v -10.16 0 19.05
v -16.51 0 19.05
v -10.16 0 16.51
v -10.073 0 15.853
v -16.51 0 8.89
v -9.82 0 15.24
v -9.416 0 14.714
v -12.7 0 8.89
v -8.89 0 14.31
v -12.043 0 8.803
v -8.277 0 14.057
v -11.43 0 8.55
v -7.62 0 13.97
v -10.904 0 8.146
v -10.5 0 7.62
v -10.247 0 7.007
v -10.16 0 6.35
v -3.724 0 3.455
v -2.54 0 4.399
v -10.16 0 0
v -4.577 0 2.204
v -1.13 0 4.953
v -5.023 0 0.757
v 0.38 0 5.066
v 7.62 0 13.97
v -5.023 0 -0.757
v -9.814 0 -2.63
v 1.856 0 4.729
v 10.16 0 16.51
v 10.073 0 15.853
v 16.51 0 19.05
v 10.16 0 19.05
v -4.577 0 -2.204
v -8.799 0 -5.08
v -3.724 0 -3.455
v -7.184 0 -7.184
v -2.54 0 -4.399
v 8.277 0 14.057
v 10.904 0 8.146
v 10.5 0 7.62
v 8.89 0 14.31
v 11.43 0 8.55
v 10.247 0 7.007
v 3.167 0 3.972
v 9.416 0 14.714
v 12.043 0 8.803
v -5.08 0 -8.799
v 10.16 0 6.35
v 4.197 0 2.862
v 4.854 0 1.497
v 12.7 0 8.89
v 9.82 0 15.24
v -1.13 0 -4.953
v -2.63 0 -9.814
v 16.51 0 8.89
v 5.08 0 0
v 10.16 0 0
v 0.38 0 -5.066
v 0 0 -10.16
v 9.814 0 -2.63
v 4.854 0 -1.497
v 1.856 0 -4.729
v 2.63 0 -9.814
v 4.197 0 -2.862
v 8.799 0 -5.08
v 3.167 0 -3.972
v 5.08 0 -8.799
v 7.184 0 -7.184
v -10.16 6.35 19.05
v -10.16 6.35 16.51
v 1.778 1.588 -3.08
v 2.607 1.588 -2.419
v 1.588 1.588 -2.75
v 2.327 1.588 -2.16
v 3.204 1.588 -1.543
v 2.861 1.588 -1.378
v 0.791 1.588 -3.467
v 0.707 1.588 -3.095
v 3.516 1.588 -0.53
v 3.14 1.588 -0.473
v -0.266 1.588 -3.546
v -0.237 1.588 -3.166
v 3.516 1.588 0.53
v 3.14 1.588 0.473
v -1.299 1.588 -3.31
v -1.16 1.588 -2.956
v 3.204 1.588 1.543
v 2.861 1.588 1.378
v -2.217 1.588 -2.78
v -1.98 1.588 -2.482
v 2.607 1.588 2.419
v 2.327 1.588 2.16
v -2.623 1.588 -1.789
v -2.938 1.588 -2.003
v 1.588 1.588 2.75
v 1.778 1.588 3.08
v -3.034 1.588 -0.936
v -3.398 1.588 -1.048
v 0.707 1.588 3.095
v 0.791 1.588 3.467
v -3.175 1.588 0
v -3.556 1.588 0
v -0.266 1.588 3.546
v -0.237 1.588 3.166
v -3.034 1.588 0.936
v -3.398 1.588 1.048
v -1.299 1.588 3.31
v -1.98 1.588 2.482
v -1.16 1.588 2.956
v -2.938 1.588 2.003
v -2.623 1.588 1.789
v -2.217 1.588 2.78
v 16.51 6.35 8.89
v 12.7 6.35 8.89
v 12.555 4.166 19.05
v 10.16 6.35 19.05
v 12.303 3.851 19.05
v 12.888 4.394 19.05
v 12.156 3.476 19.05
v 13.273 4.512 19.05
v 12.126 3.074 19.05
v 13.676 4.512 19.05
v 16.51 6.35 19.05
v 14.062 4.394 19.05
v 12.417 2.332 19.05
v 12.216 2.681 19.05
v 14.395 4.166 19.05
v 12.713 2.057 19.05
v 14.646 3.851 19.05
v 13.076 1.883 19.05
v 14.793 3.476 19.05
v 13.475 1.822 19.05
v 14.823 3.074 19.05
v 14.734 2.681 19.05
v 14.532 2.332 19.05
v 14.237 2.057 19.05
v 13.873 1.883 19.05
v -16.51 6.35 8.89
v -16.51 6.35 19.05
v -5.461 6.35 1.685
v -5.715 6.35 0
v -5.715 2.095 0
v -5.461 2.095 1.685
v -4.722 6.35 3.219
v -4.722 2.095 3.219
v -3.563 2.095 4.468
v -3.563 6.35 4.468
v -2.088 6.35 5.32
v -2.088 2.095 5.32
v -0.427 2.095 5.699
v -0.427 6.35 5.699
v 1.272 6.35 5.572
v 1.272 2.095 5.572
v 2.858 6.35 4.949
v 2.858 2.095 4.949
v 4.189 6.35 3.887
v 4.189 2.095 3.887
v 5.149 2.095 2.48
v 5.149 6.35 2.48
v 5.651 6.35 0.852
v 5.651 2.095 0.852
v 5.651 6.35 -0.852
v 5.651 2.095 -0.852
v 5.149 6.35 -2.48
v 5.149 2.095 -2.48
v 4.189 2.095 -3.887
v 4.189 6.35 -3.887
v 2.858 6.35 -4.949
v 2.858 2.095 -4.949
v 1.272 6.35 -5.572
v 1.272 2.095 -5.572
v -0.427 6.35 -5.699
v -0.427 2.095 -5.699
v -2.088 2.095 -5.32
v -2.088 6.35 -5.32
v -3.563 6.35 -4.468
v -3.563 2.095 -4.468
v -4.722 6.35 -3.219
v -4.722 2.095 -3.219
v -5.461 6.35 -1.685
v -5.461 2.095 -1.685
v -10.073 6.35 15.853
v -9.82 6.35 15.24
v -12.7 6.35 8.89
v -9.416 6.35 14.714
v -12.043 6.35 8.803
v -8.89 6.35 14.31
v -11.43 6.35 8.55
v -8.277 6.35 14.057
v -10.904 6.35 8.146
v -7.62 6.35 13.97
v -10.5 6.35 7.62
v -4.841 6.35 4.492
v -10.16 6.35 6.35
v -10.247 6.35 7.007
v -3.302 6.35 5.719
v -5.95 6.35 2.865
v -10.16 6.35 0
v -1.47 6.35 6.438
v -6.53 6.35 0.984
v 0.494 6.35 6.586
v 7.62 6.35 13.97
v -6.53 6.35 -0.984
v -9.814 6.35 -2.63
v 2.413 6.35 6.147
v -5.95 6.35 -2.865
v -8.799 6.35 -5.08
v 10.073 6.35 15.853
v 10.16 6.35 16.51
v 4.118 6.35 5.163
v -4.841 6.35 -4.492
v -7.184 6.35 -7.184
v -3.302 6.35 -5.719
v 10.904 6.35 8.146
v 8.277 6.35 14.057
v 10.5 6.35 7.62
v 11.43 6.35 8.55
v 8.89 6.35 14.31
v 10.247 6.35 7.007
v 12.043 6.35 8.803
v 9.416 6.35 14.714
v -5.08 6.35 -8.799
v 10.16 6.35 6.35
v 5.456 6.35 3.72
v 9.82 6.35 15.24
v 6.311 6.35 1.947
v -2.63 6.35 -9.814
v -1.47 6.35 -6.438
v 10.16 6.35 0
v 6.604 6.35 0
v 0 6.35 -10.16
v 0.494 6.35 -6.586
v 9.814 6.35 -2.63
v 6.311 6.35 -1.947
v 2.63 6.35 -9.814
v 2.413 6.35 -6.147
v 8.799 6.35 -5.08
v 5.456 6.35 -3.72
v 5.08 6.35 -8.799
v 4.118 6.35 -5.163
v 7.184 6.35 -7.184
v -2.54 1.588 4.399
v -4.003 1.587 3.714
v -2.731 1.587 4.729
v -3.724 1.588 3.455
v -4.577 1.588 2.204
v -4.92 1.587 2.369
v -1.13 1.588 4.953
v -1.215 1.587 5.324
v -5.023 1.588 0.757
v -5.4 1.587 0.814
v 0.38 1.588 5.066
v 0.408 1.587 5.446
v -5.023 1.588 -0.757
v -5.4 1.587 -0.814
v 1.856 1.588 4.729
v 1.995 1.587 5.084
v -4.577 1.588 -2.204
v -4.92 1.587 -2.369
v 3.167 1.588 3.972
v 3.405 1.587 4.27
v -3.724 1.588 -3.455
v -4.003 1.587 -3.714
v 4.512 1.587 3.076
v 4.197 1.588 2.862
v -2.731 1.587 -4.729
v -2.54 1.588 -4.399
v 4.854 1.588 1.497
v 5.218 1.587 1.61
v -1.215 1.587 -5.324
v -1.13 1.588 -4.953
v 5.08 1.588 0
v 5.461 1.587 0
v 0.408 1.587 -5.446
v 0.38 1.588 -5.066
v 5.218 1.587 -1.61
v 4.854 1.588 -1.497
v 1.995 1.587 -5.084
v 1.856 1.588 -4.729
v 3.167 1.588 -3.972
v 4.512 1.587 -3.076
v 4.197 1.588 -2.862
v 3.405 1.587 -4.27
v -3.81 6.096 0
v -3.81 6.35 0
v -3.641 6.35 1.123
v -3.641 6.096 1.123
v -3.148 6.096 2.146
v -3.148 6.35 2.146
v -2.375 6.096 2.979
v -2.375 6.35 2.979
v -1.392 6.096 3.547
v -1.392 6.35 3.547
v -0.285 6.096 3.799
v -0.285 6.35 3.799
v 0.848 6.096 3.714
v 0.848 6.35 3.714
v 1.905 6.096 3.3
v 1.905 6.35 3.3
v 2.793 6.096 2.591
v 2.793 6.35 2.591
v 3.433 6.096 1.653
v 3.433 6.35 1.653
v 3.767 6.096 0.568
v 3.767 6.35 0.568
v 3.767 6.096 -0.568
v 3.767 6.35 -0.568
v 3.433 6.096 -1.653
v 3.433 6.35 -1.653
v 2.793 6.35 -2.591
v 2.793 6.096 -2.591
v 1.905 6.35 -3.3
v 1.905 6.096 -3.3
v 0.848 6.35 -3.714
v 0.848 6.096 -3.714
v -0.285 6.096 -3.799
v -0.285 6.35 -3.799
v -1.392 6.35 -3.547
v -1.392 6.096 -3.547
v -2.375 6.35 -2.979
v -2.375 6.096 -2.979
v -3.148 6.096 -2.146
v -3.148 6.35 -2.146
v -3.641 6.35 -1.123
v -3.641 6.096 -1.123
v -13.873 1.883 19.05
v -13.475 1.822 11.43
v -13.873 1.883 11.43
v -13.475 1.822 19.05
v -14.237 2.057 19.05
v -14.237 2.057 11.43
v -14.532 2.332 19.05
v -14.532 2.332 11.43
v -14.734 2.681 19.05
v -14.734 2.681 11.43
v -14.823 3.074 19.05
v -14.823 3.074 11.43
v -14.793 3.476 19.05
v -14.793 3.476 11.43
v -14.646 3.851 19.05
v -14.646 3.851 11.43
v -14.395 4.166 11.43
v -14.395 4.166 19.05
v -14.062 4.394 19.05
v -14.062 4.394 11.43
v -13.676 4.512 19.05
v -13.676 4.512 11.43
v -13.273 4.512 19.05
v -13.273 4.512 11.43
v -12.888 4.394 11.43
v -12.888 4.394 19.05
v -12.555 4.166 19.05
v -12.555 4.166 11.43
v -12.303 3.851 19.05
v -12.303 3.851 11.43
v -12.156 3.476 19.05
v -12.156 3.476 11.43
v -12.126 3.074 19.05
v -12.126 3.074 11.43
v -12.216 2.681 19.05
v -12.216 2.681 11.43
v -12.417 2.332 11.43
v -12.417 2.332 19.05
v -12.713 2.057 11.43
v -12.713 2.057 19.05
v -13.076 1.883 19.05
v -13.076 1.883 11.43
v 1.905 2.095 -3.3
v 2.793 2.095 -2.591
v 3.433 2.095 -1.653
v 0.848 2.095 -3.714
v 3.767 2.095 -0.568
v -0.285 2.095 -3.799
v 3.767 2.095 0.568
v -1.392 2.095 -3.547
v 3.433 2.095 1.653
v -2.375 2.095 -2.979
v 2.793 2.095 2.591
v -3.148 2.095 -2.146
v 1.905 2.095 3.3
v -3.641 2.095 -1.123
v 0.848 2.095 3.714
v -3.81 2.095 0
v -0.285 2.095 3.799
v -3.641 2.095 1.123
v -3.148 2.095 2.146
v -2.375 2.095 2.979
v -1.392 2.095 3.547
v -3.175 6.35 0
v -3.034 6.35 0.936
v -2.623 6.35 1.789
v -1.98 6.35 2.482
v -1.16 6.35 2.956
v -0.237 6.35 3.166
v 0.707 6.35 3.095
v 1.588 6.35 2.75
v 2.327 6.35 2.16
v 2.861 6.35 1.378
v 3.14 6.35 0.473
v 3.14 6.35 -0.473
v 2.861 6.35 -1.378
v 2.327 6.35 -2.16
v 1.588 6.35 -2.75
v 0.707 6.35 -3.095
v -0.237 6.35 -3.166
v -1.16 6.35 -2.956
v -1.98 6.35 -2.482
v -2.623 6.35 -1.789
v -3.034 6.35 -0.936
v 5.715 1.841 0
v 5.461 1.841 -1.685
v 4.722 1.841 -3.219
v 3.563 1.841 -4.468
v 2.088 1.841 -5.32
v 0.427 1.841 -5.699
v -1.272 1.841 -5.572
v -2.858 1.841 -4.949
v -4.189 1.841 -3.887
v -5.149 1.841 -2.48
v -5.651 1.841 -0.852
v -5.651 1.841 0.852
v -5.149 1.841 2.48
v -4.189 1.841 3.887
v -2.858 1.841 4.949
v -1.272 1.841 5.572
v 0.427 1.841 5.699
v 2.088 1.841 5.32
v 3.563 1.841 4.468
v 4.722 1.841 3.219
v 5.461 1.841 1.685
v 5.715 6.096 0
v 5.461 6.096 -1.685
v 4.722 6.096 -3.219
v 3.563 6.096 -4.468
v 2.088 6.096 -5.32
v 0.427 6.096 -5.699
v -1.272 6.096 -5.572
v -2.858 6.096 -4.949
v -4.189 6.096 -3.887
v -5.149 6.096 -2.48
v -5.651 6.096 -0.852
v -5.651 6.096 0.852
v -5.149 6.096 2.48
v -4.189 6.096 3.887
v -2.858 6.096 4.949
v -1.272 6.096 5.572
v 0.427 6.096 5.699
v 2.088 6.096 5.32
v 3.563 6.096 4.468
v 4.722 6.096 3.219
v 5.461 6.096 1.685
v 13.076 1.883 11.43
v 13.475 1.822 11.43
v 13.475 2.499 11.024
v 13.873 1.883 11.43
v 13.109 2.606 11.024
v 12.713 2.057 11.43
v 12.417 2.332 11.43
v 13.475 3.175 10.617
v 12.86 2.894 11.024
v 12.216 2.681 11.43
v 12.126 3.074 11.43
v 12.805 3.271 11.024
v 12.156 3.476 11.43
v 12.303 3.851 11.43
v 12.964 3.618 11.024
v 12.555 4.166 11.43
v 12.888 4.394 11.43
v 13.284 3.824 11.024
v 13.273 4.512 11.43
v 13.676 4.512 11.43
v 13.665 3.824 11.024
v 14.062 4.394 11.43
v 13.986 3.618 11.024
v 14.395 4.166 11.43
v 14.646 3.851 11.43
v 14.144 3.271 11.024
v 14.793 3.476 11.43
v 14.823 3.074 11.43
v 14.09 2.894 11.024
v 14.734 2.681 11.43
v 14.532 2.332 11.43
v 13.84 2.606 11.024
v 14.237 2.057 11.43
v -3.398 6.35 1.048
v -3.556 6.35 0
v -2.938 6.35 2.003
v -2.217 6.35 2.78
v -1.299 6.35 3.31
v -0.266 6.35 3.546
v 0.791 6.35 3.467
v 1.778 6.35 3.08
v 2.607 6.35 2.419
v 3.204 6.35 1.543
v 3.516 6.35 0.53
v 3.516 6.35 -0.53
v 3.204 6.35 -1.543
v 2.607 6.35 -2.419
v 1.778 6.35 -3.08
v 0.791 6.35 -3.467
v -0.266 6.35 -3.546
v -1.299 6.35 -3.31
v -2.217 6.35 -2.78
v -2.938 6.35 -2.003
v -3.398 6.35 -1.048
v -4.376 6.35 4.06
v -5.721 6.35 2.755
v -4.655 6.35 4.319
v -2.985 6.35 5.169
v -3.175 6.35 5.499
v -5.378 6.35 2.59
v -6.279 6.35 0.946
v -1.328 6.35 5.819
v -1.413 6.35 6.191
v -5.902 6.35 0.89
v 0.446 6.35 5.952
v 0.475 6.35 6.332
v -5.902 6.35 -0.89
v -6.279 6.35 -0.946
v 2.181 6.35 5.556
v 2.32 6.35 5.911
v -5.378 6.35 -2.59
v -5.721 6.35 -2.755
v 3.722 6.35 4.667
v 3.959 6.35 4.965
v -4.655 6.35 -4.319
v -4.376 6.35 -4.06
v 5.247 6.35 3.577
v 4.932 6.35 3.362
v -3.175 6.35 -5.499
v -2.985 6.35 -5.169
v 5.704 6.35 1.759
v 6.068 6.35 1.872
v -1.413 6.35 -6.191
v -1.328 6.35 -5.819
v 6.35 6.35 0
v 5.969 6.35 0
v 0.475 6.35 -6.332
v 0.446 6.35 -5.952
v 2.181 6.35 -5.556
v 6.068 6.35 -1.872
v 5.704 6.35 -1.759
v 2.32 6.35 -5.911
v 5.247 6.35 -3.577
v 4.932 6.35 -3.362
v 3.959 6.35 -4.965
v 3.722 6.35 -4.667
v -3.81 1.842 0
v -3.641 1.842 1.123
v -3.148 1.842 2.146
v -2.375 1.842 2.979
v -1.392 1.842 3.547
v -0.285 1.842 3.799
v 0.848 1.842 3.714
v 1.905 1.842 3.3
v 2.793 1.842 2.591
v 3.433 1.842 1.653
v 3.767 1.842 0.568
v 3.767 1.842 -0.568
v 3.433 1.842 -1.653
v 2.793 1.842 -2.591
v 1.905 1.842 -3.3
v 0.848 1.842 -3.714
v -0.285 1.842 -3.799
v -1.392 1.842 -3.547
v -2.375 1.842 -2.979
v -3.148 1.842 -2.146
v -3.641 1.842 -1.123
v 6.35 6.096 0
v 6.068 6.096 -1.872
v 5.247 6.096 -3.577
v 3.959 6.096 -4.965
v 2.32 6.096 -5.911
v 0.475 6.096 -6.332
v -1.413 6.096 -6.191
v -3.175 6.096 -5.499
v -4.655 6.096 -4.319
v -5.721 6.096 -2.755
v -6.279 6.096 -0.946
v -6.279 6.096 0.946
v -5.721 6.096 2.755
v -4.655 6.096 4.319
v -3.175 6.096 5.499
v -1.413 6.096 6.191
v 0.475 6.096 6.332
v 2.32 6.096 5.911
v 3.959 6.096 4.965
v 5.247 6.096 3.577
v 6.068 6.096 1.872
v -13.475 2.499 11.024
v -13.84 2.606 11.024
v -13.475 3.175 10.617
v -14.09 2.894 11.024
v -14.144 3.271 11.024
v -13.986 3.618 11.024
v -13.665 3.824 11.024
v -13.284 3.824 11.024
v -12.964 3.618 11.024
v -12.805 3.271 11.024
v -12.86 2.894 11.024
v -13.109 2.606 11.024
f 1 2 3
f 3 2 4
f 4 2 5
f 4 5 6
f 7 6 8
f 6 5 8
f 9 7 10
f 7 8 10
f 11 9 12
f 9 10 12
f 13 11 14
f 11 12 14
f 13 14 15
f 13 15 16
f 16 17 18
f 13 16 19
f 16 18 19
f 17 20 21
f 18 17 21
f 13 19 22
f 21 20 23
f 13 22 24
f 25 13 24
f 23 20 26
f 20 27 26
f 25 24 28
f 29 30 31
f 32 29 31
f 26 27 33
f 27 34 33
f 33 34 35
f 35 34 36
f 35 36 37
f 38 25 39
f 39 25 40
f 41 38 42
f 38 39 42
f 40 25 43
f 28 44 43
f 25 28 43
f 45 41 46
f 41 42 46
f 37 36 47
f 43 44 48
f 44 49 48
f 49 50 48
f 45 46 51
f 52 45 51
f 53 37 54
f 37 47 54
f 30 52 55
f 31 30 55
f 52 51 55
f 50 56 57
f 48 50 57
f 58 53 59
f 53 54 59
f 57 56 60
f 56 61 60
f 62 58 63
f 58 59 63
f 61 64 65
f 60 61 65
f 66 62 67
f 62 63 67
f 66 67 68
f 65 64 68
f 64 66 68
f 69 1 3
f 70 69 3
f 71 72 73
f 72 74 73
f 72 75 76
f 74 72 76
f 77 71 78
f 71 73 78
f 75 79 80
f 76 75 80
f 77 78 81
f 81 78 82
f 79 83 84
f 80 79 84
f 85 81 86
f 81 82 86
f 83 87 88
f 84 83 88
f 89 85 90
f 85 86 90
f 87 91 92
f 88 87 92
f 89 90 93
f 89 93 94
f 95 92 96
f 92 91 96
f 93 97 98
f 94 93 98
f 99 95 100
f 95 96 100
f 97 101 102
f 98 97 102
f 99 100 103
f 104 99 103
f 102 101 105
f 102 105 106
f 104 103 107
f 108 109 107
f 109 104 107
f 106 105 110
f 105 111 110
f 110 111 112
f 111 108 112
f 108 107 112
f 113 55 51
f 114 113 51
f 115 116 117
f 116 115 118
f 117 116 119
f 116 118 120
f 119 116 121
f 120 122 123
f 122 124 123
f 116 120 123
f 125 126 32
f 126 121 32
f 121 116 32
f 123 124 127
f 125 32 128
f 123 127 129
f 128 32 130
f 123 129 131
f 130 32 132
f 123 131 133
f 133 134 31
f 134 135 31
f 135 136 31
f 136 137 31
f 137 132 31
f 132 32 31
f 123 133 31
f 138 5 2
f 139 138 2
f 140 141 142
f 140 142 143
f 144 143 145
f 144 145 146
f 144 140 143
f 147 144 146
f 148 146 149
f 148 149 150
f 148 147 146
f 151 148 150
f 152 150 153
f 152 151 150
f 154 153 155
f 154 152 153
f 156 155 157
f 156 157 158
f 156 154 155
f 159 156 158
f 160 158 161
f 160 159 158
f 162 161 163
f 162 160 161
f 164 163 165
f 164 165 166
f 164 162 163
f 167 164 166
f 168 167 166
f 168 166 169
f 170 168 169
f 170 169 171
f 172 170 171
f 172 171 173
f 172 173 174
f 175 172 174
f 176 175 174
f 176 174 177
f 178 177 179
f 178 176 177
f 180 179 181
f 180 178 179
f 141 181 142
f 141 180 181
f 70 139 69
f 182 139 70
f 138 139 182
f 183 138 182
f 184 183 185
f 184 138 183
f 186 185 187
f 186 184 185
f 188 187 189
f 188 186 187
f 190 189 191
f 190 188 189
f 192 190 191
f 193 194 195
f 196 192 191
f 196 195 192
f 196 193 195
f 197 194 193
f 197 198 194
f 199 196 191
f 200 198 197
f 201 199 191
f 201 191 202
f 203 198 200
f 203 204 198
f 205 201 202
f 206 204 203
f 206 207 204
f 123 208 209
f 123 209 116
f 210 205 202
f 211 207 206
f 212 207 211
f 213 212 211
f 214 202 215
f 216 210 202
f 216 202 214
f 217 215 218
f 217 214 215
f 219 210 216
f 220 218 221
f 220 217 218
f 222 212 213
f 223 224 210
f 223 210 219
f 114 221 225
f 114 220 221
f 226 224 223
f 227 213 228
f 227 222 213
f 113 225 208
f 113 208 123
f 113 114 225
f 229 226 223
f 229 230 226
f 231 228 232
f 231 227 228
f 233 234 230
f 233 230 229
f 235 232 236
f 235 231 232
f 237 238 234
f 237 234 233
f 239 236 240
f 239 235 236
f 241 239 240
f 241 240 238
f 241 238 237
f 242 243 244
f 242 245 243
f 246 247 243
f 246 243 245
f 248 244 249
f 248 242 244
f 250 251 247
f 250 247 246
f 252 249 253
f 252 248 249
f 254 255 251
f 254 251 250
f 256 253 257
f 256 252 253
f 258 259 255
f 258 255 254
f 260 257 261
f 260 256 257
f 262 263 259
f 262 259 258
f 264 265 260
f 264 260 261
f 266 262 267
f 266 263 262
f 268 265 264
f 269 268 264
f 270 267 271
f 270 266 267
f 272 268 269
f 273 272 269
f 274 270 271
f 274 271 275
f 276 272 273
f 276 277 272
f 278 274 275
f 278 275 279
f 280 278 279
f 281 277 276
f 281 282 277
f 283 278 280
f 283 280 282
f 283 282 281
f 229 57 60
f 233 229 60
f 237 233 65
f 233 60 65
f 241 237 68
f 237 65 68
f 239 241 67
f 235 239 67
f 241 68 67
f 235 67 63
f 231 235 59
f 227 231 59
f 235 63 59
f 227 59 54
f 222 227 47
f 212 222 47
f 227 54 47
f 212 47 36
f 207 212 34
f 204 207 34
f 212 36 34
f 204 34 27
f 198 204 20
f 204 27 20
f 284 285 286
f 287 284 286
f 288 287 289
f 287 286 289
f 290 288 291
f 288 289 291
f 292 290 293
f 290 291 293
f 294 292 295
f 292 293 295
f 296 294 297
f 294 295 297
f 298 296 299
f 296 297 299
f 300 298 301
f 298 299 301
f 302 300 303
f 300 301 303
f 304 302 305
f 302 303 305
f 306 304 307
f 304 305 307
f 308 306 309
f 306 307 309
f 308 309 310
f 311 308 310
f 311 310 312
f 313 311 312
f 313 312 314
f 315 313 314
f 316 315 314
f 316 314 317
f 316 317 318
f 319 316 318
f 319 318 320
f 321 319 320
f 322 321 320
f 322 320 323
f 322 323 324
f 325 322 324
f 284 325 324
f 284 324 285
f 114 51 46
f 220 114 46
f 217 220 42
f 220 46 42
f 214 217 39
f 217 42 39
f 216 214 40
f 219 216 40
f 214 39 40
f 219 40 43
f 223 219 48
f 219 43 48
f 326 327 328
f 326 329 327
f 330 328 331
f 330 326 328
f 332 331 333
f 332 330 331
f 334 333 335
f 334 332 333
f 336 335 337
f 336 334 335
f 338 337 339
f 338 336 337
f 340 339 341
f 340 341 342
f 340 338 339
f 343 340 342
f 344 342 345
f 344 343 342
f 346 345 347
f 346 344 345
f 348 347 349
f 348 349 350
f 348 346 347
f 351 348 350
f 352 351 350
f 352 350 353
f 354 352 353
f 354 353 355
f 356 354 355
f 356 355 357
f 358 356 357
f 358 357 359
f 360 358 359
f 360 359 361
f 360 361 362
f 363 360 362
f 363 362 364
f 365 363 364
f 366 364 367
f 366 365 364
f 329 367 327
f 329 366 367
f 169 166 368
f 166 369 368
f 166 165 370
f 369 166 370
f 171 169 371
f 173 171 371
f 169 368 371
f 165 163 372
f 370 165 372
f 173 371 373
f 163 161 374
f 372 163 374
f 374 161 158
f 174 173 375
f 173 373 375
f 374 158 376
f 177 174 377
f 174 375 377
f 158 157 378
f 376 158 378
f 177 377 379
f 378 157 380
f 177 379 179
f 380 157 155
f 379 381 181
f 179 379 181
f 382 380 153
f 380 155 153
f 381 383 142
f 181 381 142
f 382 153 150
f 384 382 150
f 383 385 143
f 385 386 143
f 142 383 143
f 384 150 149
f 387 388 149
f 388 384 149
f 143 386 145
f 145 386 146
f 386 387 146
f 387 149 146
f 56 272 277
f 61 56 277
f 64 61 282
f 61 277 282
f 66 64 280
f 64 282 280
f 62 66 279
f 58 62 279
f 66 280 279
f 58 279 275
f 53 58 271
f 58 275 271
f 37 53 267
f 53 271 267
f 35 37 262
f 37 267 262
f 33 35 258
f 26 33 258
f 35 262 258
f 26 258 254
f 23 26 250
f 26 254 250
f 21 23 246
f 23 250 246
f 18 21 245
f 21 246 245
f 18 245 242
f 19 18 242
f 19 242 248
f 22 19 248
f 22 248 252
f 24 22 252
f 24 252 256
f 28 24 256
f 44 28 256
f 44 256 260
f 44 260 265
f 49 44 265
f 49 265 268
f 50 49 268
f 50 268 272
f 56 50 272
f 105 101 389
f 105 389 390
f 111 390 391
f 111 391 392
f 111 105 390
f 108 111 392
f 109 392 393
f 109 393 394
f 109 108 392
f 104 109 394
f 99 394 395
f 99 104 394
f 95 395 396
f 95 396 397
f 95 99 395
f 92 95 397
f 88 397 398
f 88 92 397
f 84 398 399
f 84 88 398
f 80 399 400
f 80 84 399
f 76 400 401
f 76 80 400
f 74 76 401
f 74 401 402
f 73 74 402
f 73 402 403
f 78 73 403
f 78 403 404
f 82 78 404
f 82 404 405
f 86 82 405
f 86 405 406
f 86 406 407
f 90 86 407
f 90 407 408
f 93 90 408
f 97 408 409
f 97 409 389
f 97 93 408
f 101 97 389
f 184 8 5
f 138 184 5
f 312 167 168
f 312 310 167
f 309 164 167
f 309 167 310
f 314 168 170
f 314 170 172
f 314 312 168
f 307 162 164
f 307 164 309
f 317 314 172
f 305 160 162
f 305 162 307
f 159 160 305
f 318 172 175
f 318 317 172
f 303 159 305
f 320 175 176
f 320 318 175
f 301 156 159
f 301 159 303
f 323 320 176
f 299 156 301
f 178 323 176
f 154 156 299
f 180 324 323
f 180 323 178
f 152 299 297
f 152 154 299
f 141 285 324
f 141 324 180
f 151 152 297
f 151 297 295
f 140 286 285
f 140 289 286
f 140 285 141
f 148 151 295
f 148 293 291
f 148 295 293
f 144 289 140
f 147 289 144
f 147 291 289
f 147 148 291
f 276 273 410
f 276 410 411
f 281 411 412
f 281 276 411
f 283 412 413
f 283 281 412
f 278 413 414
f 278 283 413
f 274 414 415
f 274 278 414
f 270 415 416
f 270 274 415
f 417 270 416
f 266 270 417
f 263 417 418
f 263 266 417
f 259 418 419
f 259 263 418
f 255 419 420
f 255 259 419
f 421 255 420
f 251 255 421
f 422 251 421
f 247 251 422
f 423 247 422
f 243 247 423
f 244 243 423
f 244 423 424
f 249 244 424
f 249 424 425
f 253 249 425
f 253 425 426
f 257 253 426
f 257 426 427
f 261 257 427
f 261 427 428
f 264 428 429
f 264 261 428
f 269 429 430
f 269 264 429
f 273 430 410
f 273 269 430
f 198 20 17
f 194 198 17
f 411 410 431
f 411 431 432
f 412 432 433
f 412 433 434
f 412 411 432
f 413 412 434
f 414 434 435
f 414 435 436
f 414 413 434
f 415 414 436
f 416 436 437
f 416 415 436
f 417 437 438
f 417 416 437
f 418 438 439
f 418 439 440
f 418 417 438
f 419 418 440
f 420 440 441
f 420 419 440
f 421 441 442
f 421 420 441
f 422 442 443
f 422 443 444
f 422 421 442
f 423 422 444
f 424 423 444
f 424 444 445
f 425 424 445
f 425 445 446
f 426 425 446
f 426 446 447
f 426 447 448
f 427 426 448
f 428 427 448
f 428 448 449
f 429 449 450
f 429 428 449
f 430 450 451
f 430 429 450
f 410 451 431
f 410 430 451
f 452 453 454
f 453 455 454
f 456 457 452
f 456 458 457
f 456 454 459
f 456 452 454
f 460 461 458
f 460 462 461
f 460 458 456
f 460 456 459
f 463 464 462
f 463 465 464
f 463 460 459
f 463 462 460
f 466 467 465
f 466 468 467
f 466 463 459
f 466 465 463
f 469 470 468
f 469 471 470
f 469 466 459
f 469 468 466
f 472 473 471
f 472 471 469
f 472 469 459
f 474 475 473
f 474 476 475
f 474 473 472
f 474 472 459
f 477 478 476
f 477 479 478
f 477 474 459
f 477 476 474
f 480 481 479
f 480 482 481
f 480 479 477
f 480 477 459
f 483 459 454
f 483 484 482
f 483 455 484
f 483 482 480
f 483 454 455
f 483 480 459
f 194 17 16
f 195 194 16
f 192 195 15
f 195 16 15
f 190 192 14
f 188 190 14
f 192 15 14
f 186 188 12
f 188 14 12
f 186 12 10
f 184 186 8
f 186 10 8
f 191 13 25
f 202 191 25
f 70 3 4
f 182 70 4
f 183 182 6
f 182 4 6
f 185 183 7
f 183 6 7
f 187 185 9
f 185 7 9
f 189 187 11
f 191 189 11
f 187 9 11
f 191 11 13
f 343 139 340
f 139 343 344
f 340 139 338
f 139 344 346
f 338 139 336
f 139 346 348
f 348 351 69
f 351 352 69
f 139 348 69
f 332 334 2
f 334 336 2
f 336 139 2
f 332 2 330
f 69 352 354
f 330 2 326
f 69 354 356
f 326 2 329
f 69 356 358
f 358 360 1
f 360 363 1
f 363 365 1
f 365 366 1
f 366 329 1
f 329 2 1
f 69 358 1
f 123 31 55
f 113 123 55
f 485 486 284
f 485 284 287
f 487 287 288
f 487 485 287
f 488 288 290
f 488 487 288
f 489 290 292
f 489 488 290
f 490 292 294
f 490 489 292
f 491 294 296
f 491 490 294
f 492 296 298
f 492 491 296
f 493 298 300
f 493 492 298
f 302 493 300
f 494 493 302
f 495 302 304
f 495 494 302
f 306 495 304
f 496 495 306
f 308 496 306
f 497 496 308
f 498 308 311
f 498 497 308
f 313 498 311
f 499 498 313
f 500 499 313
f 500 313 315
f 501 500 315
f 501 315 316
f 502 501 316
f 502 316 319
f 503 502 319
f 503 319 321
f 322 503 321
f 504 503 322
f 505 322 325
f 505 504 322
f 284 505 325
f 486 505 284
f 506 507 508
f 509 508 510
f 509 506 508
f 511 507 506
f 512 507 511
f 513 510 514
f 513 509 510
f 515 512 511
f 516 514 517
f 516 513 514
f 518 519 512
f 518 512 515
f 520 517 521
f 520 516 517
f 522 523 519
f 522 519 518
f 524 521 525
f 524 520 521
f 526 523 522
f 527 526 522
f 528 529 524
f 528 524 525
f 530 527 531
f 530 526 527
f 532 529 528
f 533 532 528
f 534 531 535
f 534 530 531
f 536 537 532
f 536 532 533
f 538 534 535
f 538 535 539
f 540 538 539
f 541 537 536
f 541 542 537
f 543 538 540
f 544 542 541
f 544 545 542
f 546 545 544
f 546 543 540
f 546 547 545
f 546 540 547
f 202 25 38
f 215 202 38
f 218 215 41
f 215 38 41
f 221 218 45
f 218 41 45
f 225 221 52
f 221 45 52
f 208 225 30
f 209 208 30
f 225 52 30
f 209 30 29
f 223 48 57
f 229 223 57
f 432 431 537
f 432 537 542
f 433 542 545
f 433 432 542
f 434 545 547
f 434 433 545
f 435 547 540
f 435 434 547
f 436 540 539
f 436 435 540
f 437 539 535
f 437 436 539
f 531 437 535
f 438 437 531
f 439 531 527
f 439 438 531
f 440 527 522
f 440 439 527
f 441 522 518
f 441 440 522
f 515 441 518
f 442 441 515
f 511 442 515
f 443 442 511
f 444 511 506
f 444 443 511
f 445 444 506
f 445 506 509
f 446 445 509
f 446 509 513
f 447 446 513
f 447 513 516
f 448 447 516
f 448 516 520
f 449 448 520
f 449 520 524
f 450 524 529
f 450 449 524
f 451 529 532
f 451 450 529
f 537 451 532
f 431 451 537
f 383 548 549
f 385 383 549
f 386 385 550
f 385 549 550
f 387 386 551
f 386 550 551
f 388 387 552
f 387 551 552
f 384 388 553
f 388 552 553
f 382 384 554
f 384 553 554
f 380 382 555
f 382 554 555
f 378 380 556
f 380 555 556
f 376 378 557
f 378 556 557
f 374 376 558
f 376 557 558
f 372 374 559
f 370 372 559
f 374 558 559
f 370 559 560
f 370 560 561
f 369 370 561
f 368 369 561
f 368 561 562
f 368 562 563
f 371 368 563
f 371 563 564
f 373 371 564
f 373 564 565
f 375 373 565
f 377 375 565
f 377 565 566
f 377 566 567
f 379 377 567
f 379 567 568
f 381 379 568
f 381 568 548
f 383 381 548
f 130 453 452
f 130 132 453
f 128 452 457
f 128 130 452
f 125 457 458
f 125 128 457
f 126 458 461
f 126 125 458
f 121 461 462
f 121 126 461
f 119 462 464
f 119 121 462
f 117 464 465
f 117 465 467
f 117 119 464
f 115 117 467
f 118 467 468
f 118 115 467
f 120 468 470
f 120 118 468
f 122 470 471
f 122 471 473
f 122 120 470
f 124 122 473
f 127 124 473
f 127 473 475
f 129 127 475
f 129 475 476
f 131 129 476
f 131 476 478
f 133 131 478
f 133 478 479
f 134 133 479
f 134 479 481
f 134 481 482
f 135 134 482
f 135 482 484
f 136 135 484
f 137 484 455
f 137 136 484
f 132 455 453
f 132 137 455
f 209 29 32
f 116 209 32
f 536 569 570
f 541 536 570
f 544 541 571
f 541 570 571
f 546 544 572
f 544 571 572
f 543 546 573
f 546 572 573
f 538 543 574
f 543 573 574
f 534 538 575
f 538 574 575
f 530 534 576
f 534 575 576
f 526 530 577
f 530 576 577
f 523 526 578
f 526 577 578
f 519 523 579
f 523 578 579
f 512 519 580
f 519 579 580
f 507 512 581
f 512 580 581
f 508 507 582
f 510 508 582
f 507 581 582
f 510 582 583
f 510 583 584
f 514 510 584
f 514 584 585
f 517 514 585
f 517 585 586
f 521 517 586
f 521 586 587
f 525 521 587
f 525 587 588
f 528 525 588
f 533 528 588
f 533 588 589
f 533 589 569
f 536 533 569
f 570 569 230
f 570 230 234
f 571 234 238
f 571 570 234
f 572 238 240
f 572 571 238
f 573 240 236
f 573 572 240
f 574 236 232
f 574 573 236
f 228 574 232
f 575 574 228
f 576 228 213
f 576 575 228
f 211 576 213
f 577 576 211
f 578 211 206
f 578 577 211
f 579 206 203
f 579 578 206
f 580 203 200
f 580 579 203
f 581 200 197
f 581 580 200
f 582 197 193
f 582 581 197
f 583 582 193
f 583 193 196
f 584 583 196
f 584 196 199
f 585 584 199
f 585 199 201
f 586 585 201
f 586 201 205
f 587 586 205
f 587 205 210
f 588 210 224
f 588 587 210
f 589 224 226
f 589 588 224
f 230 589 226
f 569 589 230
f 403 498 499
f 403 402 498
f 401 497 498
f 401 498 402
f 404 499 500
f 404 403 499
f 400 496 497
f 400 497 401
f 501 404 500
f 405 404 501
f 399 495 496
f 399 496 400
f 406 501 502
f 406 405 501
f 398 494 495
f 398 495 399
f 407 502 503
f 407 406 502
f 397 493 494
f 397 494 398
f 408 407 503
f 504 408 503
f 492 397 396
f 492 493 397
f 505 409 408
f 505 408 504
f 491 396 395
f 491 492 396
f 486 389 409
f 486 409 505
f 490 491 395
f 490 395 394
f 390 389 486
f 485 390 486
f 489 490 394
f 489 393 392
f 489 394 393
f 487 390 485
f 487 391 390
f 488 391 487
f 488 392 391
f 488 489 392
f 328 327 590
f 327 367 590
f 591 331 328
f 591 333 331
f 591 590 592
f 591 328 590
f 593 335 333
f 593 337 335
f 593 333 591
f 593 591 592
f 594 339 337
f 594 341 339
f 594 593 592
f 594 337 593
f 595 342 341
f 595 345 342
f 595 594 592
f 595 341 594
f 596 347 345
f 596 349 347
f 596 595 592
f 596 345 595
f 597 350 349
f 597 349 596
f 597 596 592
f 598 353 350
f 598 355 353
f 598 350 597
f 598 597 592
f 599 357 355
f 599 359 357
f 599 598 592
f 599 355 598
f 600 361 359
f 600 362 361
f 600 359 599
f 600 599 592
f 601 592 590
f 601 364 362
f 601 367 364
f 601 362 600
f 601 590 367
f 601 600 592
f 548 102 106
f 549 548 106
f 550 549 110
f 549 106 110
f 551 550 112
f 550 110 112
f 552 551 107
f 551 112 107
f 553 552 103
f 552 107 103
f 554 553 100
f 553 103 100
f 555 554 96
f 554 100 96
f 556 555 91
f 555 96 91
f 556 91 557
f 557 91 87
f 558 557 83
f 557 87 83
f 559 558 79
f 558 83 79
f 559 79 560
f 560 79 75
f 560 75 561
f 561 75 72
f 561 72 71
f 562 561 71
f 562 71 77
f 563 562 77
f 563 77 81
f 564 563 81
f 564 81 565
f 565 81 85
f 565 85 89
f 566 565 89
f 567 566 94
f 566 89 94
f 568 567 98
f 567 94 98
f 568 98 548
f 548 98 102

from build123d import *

# Parameters (mm, degrees)
BOSS_EXTRUDE1_DEPTH            = 6.35
SKETCH2_R                      = 6.35
CUT_EXTRUDE1_DEPTH             = 4.7625
CUT_EXTRUDE2_REACH             = 3.587
SKETCH3_R                      = 5.08
CHAMFER1_SIZE                  = 0.254
SKETCH4_R                      = 6.35
SKETCH4_R_2                    = 5.715
BOSS_EXTRUDE2_DEPTH            = 4.7625
CHAMFER2_SIZE                  = 0.254
SKETCH5_R                      = 3.81
SKETCH5_R_2                    = 3.175
BOSS_EXTRUDE3_DEPTH            = 4.7625
CHAMFER3_SIZE                  = 0.254
SKETCH7_R                      = 5.715
SKETCH7_R_2                    = 3.81
BOSS_EXTRUDE4_DEPTH            = 4.2545
F_6_32_TAPPED_HOLE1_AT_2_COUNT = 2
F_6_32_TAPPED_HOLE1_AT_2_PITCH = 26.9494


with BuildPart() as part:
    # Sketch1 → Boss-Extrude1 (new body)
    with BuildSketch(Plane(origin=(0, 0, 0), x_dir=(1, 0, 0), z_dir=(0, 1, 0))):
        with BuildLine():
            Line((-10.16, 0), (-10.16, -6.35))
            ThreePointArc((-10.16, -6.35), (-10.903948776, -8.146051224), (-12.7, -8.89))
            Line((-12.7, -8.89), (-16.51, -8.89))
            Line((-16.51, -8.89), (-16.51, -19.05))
            Line((-16.51, -19.05), (-10.16, -19.05))
            Line((-10.16, -19.05), (-10.16, -16.51))
            ThreePointArc((-10.16, -16.51), (-9.416051224, -14.713948776), (-7.62, -13.97))
            Line((-7.62, -13.97), (7.62, -13.97))
            ThreePointArc((7.62, -13.97), (9.416051224, -14.713948776), (10.16, -16.51))
            Line((10.16, -16.51), (10.16, -19.05))
            Line((10.16, -19.05), (16.51, -19.05))
            Line((16.51, -19.05), (16.51, -8.89))
            Line((16.51, -8.89), (12.7, -8.89))
            ThreePointArc((12.7, -8.89), (10.903948776, -8.146051224), (10.16, -6.35))
            Line((10.16, -6.35), (10.16, 0))
            ThreePointArc((10.16, 0), (0, 10.16), (-10.16, 0))
        make_face()
    extrude(amount=BOSS_EXTRUDE1_DEPTH)

    # Sketch2 → Cut-Extrude1 (cut)
    with BuildSketch(Plane(origin=(0, 6.35, 0), x_dir=(1, 0, 0), z_dir=(0, 1, 0))):
        Circle(SKETCH2_R)
    extrude(amount=-CUT_EXTRUDE1_DEPTH, mode=Mode.SUBTRACT)

    # Sketch3 → Cut-Extrude2 (cut, up to next)
    with BuildSketch(Plane(origin=(0, 1.5875, 0), x_dir=(1, 0, 0), z_dir=(0, 1, 0)), mode=Mode.PRIVATE) as cut_extrude2_sk1:
        Circle(SKETCH3_R)
    cut_extrude2_tool1 = extrude(cut_extrude2_sk1.sketch, amount=-CUT_EXTRUDE2_REACH, mode=Mode.PRIVATE) & part.part
    add(cut_extrude2_tool1.solids().sort_by_distance((0, 1.5875, 0))[0], mode=Mode.SUBTRACT)

    # Chamfer1
    chamfer1_edges = [part.edges().sort_by_distance(p)[0] for p in [
        (-6.35, 6.35, 0),
    ]]
    chamfer(chamfer1_edges, length=CHAMFER1_SIZE)

    # Sketch4 → Boss-Extrude2 (add)
    with BuildSketch(Plane(origin=(0, 1.5875, 0), x_dir=(1, 0, 0), z_dir=(0, 1, 0))):
        Circle(SKETCH4_R)
        Circle(SKETCH4_R_2, mode=Mode.SUBTRACT)
    extrude(amount=BOSS_EXTRUDE2_DEPTH)

    # Chamfer2
    chamfer2_edges = [part.edges().sort_by_distance(p)[0] for p in [
        (-5.715, 1.5875, 0),
        (-5.715, 6.35, 0),
    ]]
    chamfer(chamfer2_edges, length=CHAMFER2_SIZE)

    # Sketch8 → #6-32 Tapped Hole1 (revolve, cut)
    with BuildSketch(Plane(origin=(-13.4747, 3.175, 19.05), x_dir=(0, -1, 0), z_dir=(1, 0, 0))):
        Polygon((0, 0), (0, 8.43269403), (1.35255, 7.62), (1.35255, 0), align=None)
    f_6_32_tapped_hole1 = revolve(axis=Axis((-13.4747, 3.175, 25.4), (0, 0, -1)), mode=Mode.SUBTRACT)

    # #6-32 Tapped Hole1 at 2: #6-32 Tapped Hole1 ×2
    with Locations(*[(i * F_6_32_TAPPED_HOLE1_AT_2_PITCH, 0, 0) for i in range(1, F_6_32_TAPPED_HOLE1_AT_2_COUNT)]):
        add(f_6_32_tapped_hole1, mode=Mode.SUBTRACT)


with BuildPart() as body_2:
    # Sketch5 → Boss-Extrude3 (new body)
    with BuildSketch(Plane(origin=(0, 1.5875, 0), x_dir=(-1, 0, 0), z_dir=(0, 1, 0))):
        Circle(SKETCH5_R)
        Circle(SKETCH5_R_2, mode=Mode.SUBTRACT)
    extrude(amount=BOSS_EXTRUDE3_DEPTH)

    # Chamfer3
    chamfer3_edges = [body_2.edges().sort_by_distance(p)[0] for p in [
        (3.81, 1.5875, 0),
        (3.81, 6.35, 0),
    ]]
    chamfer(chamfer3_edges, length=CHAMFER3_SIZE)

    # Sketch7 → Boss-Extrude4 (add)
    with BuildSketch(Plane(origin=(0, 6.35, 0), x_dir=(-1, 0, 0), z_dir=(0, 1, 0))):
        Circle(SKETCH7_R)
        Circle(SKETCH7_R_2, mode=Mode.SUBTRACT)
    extrude(amount=-BOSS_EXTRUDE4_DEPTH)


solid = Compound([part.part, body_2.part])
